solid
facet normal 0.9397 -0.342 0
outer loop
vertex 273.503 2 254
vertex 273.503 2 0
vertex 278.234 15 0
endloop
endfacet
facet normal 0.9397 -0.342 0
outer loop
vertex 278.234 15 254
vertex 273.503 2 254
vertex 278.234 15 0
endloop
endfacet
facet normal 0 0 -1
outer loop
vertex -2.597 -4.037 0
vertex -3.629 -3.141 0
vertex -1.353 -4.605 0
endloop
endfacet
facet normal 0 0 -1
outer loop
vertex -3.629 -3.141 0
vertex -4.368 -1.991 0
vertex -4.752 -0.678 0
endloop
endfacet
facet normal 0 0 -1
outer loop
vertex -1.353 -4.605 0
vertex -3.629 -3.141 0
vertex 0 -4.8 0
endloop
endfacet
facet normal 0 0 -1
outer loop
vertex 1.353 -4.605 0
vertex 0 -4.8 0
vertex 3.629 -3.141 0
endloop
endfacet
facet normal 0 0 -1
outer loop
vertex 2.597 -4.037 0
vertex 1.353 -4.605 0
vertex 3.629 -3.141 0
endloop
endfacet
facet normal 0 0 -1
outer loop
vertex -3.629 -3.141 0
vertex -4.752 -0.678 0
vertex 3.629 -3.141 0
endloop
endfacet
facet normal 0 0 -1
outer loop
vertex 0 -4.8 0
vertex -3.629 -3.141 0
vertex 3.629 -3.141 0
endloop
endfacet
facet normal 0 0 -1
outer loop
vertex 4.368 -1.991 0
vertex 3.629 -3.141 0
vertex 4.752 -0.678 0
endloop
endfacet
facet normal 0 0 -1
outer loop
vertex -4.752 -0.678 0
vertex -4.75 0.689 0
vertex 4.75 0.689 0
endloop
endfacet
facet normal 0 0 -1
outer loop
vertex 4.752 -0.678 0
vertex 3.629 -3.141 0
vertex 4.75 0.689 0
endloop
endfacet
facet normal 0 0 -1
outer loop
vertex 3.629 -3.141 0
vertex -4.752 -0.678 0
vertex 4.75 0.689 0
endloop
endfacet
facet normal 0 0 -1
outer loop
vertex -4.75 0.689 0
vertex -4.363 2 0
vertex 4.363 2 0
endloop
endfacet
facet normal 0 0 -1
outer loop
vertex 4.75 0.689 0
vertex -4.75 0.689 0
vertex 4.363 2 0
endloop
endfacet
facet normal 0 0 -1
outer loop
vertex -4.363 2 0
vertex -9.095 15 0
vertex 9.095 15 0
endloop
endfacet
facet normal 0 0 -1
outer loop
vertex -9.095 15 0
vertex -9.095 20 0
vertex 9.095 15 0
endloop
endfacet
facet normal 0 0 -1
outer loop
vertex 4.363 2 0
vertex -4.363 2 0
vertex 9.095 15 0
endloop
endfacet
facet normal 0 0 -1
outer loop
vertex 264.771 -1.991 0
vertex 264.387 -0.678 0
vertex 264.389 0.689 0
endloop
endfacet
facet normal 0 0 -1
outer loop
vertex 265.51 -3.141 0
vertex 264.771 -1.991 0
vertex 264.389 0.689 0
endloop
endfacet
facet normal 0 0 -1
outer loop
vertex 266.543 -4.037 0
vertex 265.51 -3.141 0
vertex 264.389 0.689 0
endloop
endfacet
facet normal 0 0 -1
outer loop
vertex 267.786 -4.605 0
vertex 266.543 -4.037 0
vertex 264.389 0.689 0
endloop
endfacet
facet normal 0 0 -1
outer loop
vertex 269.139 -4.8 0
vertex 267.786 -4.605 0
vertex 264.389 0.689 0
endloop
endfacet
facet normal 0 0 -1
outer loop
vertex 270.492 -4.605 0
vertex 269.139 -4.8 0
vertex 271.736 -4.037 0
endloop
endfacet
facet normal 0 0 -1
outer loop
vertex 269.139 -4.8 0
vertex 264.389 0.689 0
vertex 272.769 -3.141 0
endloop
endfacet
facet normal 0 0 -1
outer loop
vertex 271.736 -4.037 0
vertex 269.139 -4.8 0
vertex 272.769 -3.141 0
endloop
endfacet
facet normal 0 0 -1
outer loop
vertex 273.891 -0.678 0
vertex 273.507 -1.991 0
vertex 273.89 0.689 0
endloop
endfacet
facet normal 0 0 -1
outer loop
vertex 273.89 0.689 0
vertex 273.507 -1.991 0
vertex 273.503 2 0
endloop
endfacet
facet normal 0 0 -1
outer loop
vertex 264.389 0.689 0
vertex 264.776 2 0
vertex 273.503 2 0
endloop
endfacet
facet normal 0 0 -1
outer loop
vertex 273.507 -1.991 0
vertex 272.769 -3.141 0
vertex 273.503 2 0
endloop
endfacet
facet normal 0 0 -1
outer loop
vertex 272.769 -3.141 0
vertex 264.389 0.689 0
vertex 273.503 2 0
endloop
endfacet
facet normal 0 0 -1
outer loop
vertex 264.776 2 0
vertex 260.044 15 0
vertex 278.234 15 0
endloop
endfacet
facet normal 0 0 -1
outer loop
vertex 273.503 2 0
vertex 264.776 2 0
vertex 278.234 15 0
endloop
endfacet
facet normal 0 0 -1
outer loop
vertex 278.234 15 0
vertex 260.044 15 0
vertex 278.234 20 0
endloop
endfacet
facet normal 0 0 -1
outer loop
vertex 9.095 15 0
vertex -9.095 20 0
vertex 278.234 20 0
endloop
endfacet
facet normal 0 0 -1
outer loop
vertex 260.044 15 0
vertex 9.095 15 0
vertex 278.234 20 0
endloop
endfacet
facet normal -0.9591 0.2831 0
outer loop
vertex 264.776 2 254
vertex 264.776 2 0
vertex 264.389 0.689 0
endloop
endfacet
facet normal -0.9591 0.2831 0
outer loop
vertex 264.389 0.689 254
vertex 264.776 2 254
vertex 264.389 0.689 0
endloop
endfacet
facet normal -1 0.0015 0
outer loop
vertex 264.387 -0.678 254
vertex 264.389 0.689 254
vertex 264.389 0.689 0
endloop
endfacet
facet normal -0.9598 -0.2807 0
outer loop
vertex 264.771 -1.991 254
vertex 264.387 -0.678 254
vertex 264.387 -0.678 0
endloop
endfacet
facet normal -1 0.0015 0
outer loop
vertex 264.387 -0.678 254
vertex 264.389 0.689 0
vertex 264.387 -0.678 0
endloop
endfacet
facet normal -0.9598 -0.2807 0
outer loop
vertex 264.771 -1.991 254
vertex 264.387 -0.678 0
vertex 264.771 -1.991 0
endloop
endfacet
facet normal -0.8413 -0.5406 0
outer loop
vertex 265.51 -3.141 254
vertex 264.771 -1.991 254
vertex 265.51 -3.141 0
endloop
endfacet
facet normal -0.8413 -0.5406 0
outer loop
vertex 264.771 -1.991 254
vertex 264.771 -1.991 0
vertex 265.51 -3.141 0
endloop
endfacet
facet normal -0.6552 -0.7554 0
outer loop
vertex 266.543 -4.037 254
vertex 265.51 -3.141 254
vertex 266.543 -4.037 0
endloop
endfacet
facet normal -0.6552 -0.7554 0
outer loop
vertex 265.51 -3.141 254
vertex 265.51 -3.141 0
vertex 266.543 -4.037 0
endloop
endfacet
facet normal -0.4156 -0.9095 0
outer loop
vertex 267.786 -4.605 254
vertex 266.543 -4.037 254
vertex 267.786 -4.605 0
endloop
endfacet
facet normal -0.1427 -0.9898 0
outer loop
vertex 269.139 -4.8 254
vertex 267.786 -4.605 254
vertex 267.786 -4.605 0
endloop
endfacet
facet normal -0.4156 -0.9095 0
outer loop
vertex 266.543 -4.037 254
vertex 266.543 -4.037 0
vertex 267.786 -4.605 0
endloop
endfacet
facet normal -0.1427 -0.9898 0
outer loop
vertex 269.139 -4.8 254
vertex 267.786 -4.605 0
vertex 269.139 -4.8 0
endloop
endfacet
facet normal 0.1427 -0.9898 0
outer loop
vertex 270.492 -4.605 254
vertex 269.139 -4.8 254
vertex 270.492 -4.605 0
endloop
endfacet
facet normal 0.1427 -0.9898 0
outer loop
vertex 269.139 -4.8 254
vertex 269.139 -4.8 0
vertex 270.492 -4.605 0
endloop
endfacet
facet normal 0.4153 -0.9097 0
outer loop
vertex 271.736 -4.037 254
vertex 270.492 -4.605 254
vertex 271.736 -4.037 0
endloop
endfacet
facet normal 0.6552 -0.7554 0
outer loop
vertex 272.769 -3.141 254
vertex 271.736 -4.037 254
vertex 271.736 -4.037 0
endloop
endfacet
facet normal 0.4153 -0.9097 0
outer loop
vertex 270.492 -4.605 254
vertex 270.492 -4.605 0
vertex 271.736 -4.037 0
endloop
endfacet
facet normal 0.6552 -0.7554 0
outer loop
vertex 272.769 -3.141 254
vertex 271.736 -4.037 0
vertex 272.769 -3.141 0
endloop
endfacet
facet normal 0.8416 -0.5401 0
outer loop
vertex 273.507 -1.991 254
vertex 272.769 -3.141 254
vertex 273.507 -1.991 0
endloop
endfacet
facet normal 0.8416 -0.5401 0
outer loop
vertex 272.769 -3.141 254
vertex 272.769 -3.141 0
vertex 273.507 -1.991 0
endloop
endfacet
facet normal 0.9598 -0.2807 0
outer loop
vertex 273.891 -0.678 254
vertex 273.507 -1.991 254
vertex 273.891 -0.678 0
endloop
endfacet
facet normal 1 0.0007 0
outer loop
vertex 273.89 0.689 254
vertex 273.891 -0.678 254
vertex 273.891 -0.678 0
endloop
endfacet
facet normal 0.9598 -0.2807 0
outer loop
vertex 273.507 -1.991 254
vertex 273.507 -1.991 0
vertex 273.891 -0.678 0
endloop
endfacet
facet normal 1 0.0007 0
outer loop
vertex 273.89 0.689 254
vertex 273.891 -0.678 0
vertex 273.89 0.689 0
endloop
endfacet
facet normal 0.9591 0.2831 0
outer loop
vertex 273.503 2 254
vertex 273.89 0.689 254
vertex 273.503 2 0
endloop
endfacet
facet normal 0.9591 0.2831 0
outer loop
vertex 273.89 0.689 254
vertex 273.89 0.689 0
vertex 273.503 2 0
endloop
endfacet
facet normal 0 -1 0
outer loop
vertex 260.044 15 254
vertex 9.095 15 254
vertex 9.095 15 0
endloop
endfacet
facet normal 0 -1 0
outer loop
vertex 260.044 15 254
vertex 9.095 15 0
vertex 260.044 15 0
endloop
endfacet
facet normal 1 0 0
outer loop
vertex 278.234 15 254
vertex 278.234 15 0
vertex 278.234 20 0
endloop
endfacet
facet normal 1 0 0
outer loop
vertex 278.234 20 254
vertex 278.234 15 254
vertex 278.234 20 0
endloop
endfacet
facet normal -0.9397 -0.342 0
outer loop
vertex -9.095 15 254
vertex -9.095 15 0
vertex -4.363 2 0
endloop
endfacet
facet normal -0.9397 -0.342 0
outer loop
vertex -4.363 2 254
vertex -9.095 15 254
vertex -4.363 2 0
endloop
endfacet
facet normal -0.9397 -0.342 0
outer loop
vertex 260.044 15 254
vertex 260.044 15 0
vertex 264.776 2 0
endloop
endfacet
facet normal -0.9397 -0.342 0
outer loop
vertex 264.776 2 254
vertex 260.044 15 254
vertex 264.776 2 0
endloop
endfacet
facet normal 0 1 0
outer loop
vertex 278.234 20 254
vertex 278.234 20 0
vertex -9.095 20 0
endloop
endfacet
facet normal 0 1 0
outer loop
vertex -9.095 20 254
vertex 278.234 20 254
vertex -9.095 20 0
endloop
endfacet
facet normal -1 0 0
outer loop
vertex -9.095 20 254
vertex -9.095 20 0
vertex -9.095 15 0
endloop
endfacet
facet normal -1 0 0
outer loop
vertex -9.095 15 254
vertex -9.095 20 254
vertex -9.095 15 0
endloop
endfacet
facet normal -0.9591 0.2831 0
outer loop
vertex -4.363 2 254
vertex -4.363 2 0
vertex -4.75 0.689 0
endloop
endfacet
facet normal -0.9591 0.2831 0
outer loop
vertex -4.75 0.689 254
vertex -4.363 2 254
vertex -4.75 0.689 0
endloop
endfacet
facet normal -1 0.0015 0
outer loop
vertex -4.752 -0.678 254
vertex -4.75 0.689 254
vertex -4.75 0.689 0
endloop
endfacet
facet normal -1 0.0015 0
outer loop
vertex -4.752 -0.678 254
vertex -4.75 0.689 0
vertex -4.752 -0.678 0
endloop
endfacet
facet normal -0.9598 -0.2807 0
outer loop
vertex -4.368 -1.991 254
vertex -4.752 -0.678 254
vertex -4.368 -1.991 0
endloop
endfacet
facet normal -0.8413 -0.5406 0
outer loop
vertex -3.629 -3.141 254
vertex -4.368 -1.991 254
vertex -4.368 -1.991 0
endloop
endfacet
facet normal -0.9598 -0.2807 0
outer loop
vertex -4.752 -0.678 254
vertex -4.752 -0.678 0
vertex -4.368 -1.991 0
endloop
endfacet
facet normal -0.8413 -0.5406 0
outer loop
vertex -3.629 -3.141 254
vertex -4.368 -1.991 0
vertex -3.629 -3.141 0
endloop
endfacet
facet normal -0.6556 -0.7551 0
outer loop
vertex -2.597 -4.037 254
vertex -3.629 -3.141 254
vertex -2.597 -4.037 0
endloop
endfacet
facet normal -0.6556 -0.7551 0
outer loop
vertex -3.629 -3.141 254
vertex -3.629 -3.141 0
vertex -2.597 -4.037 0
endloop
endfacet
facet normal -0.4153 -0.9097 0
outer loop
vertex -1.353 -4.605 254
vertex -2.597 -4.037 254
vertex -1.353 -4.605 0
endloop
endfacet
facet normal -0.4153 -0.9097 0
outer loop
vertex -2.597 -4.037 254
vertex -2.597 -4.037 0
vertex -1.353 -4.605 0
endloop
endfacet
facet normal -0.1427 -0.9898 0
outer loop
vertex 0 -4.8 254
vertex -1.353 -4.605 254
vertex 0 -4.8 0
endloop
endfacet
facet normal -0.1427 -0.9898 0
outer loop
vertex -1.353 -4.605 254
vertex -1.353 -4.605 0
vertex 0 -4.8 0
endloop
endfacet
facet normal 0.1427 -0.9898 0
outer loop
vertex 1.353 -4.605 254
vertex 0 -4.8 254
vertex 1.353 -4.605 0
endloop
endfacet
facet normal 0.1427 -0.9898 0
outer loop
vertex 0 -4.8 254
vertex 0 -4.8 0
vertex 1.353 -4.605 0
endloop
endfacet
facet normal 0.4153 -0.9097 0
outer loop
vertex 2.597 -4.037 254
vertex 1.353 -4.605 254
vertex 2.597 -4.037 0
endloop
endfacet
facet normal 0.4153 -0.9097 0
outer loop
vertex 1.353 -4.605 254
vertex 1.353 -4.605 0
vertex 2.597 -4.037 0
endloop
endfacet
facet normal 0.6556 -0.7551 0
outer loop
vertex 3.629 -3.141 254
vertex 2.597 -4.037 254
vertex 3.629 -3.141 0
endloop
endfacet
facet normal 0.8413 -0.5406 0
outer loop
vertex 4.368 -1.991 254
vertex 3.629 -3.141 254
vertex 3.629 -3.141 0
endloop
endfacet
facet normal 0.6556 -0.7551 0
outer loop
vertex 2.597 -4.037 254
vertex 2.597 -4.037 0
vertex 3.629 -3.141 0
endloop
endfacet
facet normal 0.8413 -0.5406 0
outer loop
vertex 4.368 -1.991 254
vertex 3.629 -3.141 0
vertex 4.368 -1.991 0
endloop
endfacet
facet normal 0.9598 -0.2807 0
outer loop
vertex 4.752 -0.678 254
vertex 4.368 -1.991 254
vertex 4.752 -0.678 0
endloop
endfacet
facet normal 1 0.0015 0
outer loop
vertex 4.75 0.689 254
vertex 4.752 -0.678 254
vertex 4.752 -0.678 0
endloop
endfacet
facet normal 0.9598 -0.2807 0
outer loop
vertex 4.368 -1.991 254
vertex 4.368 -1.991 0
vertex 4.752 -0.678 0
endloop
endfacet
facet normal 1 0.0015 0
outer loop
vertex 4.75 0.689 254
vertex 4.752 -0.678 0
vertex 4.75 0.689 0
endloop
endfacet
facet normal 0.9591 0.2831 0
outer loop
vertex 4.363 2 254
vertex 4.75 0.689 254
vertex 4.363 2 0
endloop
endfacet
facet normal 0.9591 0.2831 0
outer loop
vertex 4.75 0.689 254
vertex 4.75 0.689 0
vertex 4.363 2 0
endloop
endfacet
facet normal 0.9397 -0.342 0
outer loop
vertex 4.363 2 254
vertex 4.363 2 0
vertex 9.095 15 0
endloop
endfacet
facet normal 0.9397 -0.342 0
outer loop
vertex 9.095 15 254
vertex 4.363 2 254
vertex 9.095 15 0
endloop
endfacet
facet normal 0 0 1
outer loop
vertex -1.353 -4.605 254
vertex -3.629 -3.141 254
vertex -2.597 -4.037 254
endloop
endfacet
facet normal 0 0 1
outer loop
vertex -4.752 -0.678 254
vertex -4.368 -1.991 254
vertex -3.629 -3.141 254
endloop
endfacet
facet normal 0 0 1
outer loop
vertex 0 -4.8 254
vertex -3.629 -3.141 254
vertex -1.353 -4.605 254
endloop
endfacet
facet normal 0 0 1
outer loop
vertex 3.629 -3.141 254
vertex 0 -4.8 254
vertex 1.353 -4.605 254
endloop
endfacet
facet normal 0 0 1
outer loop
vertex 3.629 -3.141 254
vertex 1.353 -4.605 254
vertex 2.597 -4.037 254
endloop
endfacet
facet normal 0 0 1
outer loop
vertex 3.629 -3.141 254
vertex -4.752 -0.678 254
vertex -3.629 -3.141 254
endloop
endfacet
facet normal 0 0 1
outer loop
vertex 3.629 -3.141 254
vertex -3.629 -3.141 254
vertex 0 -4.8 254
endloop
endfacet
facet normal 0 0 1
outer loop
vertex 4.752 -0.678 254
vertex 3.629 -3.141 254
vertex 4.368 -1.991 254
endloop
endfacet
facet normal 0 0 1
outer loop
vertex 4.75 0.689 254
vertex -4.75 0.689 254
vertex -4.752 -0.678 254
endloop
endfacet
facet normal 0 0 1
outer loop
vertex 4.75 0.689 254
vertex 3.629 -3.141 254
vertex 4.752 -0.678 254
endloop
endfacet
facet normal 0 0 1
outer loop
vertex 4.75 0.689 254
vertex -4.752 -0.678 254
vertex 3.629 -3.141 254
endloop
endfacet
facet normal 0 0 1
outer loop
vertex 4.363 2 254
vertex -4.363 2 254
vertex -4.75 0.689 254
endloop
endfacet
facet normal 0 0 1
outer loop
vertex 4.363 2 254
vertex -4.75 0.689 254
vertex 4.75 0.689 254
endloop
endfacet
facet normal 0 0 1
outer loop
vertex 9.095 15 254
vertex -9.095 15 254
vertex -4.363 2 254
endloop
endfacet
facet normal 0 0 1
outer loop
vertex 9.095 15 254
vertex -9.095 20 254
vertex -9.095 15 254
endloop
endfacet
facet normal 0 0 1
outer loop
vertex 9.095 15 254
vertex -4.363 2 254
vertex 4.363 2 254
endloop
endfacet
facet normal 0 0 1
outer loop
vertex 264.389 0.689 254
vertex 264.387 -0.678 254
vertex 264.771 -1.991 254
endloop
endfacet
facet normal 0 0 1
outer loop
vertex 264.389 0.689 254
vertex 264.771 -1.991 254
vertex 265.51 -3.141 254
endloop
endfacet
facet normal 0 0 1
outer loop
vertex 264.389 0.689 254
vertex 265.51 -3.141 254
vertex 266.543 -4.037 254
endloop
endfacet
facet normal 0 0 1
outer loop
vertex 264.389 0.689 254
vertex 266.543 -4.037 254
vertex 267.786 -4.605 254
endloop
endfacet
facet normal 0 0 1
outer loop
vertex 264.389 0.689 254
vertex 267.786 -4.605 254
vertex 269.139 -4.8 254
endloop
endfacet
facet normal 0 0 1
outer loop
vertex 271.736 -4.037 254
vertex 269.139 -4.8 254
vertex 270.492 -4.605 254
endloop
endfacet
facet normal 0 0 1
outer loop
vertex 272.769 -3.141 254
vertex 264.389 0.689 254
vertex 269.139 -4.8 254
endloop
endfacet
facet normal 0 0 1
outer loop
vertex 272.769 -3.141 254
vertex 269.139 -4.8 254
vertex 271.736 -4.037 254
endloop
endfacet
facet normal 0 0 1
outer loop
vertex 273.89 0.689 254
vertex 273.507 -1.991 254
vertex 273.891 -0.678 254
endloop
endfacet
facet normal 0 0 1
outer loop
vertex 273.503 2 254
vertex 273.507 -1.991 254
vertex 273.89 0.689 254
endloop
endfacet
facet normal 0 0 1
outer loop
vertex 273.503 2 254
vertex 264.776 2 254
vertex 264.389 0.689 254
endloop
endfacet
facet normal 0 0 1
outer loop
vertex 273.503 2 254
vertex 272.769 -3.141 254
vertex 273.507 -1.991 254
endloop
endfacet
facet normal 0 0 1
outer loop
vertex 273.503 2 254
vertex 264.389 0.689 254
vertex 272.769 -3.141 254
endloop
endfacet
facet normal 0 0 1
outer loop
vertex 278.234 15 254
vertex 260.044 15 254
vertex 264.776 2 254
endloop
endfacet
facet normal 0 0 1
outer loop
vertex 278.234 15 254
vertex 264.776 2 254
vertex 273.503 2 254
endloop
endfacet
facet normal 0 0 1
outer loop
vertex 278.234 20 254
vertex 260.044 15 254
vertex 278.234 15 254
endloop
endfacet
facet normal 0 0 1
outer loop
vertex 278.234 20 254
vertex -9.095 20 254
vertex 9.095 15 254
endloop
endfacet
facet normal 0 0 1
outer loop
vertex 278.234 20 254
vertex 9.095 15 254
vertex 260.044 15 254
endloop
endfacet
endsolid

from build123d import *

# Parameters (mm, degrees)
BOSS_EXTRUDE1_DEPTH = 254


with BuildPart() as part:
    # Sketch1 → Boss-Extrude1 (new body)
    with BuildSketch(Plane.XY):
        with BuildLine():
            Line((-9.095097891, 15), (-4.363484846, 2))
            ThreePointArc((-4.363484846, 2), (0, -4.8), (4.363484846, 2))
            Line((4.363484846, 2), (9.095097891, 15))
            Line((9.095097891, 15), (260.044118109, 15))
            Line((260.044118109, 15), (264.775731154, 2))
            ThreePointArc((264.775731154, 2), (269.139216, -4.8), (273.502700846, 2))
            Line((273.502700846, 2), (278.234313891, 15))
            Line((278.234313891, 15), (278.234313891, 20))
            Line((278.234313891, 20), (-9.095097891, 20))
            Line((-9.095097891, 20), (-9.095097891, 15))
        make_face()
    extrude(amount=BOSS_EXTRUDE1_DEPTH)


solid = part.part
